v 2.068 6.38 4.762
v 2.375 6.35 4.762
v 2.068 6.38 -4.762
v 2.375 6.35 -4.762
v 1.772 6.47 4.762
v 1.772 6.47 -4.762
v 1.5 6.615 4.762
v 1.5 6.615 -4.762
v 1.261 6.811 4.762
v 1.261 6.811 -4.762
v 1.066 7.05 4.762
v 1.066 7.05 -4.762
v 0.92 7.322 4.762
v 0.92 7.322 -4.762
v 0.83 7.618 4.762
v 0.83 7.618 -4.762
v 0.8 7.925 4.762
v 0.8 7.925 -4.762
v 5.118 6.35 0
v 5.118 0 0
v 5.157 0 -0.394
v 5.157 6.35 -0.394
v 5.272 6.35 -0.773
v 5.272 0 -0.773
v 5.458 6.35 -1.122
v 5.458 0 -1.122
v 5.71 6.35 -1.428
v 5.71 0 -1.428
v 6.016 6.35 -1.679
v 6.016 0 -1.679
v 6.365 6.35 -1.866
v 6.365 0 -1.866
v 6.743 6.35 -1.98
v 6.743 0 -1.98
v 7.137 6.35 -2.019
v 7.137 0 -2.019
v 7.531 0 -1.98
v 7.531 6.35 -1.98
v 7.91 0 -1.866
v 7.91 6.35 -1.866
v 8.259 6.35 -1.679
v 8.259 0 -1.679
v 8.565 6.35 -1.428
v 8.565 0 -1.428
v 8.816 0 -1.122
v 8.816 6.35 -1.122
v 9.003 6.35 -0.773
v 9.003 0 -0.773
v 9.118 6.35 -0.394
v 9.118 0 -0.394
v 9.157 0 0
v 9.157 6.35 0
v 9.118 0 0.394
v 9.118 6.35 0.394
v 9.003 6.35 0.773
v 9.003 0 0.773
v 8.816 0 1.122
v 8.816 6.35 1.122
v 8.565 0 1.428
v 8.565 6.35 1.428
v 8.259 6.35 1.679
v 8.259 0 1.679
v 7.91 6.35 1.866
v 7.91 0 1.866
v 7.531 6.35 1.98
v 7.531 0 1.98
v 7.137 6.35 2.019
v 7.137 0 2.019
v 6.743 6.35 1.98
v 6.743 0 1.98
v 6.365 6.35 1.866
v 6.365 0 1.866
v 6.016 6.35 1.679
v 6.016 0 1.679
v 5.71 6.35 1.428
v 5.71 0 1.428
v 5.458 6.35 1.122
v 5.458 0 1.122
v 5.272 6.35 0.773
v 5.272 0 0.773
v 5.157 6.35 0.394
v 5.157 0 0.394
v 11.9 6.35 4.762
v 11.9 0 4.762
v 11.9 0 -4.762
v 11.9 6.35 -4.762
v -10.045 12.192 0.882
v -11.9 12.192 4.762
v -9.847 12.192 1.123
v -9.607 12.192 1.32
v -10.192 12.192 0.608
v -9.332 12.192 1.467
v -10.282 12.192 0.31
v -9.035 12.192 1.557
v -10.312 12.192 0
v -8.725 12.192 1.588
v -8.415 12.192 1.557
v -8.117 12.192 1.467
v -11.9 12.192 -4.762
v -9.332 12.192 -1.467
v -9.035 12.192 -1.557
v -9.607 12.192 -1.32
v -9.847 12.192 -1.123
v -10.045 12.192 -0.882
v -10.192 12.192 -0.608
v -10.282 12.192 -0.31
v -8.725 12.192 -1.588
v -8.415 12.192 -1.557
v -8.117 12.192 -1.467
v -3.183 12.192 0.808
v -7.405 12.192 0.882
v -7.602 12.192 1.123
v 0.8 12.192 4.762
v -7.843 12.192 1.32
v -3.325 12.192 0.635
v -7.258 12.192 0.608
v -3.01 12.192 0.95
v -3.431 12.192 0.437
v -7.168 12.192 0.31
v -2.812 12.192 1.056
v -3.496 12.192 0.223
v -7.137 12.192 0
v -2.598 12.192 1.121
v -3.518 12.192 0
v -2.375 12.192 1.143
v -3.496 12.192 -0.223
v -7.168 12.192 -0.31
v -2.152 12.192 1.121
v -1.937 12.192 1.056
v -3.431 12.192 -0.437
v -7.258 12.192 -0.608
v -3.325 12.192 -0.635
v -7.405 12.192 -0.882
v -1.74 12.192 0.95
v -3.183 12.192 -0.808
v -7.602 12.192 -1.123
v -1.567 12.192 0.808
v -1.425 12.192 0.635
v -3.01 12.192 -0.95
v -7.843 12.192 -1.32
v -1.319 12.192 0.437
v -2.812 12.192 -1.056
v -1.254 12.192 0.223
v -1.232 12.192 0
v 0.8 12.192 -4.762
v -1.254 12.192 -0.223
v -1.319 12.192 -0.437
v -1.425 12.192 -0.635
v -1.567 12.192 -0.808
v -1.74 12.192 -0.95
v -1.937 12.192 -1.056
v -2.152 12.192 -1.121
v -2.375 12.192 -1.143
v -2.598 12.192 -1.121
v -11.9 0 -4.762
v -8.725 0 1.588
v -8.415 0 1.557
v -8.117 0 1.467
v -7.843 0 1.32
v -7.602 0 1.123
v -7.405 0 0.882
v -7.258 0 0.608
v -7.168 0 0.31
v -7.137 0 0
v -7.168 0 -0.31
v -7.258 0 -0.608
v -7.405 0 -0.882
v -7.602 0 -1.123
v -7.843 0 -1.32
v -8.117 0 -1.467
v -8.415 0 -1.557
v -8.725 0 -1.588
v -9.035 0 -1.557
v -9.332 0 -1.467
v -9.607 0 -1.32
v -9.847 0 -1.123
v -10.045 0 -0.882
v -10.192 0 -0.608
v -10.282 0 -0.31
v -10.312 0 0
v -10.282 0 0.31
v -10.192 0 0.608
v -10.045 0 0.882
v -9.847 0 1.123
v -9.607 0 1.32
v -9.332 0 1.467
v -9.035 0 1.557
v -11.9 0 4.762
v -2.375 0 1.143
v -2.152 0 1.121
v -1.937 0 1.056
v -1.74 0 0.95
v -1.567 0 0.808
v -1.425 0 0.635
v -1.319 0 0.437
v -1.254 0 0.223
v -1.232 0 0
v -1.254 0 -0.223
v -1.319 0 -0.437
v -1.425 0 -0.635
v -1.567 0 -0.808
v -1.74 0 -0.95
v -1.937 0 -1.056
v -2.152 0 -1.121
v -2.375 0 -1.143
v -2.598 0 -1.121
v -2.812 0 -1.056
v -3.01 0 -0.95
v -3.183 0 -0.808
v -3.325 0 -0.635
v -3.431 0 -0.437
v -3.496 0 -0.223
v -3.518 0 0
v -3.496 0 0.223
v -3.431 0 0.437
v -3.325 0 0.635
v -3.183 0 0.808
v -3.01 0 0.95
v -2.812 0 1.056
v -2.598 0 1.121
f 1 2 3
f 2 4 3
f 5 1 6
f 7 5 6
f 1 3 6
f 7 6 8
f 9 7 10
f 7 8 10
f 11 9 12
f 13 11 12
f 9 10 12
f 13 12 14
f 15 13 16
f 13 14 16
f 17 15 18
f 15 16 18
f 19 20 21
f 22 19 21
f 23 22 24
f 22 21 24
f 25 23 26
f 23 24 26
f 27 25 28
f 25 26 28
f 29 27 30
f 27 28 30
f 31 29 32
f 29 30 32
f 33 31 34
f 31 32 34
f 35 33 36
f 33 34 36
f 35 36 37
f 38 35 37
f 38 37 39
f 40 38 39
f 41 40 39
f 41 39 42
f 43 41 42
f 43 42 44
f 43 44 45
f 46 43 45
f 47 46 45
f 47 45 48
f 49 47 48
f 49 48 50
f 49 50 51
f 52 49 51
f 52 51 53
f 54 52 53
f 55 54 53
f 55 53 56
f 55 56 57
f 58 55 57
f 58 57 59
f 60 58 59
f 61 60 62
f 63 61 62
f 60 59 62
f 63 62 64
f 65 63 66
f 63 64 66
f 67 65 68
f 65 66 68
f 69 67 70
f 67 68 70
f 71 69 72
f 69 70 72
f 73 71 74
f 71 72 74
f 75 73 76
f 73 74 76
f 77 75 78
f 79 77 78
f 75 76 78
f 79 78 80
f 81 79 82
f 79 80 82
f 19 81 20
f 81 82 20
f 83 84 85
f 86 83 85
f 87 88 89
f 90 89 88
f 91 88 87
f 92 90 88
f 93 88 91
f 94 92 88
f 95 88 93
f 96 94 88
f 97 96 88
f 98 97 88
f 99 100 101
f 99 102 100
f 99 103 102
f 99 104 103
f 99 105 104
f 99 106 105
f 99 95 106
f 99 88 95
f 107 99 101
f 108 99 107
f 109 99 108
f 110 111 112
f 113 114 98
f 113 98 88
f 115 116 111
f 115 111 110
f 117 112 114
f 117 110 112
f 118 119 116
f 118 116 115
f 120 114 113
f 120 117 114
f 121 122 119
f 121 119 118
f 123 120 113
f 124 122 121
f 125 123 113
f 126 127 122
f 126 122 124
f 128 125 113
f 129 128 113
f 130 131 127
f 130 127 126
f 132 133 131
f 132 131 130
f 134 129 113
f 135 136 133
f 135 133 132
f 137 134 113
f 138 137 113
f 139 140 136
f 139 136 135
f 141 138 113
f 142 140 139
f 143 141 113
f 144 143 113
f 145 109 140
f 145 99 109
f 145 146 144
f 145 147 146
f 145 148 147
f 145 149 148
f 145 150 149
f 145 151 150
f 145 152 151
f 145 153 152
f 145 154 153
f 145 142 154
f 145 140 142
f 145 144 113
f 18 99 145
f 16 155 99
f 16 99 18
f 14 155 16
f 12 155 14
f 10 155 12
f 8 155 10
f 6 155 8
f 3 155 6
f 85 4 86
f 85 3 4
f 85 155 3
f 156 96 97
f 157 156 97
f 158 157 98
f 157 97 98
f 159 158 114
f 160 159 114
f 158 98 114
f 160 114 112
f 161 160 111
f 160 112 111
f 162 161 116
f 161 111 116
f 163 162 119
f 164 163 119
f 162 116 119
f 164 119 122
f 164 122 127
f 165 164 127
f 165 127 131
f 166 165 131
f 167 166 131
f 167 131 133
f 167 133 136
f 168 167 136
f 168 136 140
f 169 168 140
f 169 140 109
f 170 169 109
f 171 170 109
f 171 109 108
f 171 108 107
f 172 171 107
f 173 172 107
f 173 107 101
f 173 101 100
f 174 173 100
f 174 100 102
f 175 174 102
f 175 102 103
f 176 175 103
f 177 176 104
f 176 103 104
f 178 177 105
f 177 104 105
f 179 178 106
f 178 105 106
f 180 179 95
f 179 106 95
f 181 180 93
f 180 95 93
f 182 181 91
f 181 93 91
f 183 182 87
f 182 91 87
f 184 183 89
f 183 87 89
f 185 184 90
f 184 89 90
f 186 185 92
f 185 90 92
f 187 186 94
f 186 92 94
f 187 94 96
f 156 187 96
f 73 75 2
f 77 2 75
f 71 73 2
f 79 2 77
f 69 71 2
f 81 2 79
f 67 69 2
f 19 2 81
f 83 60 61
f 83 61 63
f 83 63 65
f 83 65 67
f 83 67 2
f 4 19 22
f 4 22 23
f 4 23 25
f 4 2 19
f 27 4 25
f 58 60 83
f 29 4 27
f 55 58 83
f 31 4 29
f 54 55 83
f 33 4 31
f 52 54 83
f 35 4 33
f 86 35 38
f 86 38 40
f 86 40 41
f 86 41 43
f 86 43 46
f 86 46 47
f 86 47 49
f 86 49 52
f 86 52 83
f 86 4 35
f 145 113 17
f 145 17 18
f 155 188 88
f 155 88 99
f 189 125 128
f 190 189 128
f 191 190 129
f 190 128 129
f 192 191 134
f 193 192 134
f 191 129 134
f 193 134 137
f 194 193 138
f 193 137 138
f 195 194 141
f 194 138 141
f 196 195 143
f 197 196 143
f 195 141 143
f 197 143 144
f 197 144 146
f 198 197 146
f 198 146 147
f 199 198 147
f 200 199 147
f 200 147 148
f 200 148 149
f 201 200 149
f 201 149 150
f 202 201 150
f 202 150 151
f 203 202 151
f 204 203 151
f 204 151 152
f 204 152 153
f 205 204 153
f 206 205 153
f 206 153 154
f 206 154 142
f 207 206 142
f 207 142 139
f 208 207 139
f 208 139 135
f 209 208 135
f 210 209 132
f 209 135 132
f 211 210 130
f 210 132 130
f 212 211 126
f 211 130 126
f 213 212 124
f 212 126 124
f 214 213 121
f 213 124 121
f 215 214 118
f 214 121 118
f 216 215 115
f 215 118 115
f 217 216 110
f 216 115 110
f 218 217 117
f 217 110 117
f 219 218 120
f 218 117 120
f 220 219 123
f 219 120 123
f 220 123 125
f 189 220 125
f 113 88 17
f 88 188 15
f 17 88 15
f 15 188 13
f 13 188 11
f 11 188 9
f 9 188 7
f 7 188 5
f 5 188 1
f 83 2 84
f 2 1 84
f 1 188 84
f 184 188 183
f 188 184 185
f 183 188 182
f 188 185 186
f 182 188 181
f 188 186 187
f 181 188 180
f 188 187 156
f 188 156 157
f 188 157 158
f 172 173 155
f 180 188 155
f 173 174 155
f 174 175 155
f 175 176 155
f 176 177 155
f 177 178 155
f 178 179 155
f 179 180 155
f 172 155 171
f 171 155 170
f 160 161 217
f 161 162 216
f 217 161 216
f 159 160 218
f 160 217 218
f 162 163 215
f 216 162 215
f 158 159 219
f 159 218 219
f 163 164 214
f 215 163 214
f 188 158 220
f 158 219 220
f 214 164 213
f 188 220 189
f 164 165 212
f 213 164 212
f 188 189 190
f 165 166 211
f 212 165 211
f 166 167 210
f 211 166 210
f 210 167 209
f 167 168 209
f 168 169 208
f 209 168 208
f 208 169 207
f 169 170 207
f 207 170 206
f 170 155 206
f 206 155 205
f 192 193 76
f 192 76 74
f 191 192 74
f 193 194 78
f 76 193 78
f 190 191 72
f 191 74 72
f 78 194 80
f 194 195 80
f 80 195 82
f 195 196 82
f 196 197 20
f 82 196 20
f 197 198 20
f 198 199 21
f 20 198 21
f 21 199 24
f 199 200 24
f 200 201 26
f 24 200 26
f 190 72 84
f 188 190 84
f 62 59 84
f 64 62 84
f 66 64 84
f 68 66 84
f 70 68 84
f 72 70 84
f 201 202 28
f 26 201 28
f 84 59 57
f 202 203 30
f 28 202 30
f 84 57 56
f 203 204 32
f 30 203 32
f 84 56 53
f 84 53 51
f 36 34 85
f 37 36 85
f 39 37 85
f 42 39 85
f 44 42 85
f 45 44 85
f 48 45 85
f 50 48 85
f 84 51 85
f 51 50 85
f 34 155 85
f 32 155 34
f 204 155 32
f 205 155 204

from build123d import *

# Parameters (mm, degrees)
SKETCH1_W                 = 23.7998
SKETCH1_H                 = 9.525
BOSS_EXTRUDE1_DEPTH       = 12.192
SKETCH2_W                 = 11.0998
SKETCH2_H                 = 9.525
CUT_EXTRUDE1_DEPTH        = 5.842
FILLET1_R                 = 1.5748
F_4_40_TAPPED_HOLE5_D     = 2.2606
F_4_40_TAPPED_HOLE5_DEPTH = 6.35
F_4_40_TAPPED_HOLE5_TIP   = 0.679152758
SKETCH4_R                 = 1.5875
SKETCH4_R_2               = 1.143
CUT_EXTRUDE2_DEPTH        = 18.689937543
F_10_32_TAPPED_HOLE1_D    = 4.0386


with BuildPart() as part:
    # Sketch1 → Boss-Extrude1 (new body)
    with BuildSketch(Plane(origin=(0, 0, 0), x_dir=(1, 0, 0), z_dir=(0, 1, 0))):
        Rectangle(SKETCH1_W, SKETCH1_H)
    extrude(amount=BOSS_EXTRUDE1_DEPTH)

    # Sketch2 → Cut-Extrude1 (cut)
    with BuildSketch(Plane(origin=(0, 12.192, 0), x_dir=(1, 0, 0), z_dir=(0, 1, 0))):
        with Locations((6.35, 0)):
            Rectangle(SKETCH2_W, SKETCH2_H)
    extrude(amount=-CUT_EXTRUDE1_DEPTH, mode=Mode.SUBTRACT)

    # Fillet1
    fillet1_edges = [part.edges().sort_by_distance(p)[0] for p in [
        (0.8001, 6.35, 0),
    ]]
    fillet(fillet1_edges, radius=FILLET1_R)

    # #4-40 Tapped Hole5
    with Locations(Plane(origin=(-2.3749, 12.192, 0), x_dir=(0, 0, 1), z_dir=(0, 1, 0))):
        with Locations((0, 0)):
            Hole(F_4_40_TAPPED_HOLE5_D / 2, depth=F_4_40_TAPPED_HOLE5_DEPTH)
            with Locations((0, 0, -(F_4_40_TAPPED_HOLE5_DEPTH + F_4_40_TAPPED_HOLE5_TIP / 2))):  # 118° drill point
                Cone(0, F_4_40_TAPPED_HOLE5_D / 2, F_4_40_TAPPED_HOLE5_TIP, mode=Mode.SUBTRACT)

    # Sketch4 → Cut-Extrude2 (cut, through all)
    with BuildSketch(Plane(origin=(0, 12.192, 0), x_dir=(1, 0, 0), z_dir=(0, 1, 0))):
        with Locations(Location((-8.7249, 0, 0), (0, 0, 270))):
            Circle(SKETCH4_R)
        with Locations(Location((-2.3749, 0, 0), (0, 0, 270))):
            Circle(SKETCH4_R_2)
    extrude(amount=-CUT_EXTRUDE2_DEPTH, mode=Mode.SUBTRACT)

    # #10-32 Tapped Hole1 (through all)
    with Locations(Plane(origin=(0, 6.35, 0), x_dir=(1, 0, 0), z_dir=(0, 1, 0))):
        with Locations((7.1374, 0)):
            Hole(F_10_32_TAPPED_HOLE1_D / 2)


solid = part.part
